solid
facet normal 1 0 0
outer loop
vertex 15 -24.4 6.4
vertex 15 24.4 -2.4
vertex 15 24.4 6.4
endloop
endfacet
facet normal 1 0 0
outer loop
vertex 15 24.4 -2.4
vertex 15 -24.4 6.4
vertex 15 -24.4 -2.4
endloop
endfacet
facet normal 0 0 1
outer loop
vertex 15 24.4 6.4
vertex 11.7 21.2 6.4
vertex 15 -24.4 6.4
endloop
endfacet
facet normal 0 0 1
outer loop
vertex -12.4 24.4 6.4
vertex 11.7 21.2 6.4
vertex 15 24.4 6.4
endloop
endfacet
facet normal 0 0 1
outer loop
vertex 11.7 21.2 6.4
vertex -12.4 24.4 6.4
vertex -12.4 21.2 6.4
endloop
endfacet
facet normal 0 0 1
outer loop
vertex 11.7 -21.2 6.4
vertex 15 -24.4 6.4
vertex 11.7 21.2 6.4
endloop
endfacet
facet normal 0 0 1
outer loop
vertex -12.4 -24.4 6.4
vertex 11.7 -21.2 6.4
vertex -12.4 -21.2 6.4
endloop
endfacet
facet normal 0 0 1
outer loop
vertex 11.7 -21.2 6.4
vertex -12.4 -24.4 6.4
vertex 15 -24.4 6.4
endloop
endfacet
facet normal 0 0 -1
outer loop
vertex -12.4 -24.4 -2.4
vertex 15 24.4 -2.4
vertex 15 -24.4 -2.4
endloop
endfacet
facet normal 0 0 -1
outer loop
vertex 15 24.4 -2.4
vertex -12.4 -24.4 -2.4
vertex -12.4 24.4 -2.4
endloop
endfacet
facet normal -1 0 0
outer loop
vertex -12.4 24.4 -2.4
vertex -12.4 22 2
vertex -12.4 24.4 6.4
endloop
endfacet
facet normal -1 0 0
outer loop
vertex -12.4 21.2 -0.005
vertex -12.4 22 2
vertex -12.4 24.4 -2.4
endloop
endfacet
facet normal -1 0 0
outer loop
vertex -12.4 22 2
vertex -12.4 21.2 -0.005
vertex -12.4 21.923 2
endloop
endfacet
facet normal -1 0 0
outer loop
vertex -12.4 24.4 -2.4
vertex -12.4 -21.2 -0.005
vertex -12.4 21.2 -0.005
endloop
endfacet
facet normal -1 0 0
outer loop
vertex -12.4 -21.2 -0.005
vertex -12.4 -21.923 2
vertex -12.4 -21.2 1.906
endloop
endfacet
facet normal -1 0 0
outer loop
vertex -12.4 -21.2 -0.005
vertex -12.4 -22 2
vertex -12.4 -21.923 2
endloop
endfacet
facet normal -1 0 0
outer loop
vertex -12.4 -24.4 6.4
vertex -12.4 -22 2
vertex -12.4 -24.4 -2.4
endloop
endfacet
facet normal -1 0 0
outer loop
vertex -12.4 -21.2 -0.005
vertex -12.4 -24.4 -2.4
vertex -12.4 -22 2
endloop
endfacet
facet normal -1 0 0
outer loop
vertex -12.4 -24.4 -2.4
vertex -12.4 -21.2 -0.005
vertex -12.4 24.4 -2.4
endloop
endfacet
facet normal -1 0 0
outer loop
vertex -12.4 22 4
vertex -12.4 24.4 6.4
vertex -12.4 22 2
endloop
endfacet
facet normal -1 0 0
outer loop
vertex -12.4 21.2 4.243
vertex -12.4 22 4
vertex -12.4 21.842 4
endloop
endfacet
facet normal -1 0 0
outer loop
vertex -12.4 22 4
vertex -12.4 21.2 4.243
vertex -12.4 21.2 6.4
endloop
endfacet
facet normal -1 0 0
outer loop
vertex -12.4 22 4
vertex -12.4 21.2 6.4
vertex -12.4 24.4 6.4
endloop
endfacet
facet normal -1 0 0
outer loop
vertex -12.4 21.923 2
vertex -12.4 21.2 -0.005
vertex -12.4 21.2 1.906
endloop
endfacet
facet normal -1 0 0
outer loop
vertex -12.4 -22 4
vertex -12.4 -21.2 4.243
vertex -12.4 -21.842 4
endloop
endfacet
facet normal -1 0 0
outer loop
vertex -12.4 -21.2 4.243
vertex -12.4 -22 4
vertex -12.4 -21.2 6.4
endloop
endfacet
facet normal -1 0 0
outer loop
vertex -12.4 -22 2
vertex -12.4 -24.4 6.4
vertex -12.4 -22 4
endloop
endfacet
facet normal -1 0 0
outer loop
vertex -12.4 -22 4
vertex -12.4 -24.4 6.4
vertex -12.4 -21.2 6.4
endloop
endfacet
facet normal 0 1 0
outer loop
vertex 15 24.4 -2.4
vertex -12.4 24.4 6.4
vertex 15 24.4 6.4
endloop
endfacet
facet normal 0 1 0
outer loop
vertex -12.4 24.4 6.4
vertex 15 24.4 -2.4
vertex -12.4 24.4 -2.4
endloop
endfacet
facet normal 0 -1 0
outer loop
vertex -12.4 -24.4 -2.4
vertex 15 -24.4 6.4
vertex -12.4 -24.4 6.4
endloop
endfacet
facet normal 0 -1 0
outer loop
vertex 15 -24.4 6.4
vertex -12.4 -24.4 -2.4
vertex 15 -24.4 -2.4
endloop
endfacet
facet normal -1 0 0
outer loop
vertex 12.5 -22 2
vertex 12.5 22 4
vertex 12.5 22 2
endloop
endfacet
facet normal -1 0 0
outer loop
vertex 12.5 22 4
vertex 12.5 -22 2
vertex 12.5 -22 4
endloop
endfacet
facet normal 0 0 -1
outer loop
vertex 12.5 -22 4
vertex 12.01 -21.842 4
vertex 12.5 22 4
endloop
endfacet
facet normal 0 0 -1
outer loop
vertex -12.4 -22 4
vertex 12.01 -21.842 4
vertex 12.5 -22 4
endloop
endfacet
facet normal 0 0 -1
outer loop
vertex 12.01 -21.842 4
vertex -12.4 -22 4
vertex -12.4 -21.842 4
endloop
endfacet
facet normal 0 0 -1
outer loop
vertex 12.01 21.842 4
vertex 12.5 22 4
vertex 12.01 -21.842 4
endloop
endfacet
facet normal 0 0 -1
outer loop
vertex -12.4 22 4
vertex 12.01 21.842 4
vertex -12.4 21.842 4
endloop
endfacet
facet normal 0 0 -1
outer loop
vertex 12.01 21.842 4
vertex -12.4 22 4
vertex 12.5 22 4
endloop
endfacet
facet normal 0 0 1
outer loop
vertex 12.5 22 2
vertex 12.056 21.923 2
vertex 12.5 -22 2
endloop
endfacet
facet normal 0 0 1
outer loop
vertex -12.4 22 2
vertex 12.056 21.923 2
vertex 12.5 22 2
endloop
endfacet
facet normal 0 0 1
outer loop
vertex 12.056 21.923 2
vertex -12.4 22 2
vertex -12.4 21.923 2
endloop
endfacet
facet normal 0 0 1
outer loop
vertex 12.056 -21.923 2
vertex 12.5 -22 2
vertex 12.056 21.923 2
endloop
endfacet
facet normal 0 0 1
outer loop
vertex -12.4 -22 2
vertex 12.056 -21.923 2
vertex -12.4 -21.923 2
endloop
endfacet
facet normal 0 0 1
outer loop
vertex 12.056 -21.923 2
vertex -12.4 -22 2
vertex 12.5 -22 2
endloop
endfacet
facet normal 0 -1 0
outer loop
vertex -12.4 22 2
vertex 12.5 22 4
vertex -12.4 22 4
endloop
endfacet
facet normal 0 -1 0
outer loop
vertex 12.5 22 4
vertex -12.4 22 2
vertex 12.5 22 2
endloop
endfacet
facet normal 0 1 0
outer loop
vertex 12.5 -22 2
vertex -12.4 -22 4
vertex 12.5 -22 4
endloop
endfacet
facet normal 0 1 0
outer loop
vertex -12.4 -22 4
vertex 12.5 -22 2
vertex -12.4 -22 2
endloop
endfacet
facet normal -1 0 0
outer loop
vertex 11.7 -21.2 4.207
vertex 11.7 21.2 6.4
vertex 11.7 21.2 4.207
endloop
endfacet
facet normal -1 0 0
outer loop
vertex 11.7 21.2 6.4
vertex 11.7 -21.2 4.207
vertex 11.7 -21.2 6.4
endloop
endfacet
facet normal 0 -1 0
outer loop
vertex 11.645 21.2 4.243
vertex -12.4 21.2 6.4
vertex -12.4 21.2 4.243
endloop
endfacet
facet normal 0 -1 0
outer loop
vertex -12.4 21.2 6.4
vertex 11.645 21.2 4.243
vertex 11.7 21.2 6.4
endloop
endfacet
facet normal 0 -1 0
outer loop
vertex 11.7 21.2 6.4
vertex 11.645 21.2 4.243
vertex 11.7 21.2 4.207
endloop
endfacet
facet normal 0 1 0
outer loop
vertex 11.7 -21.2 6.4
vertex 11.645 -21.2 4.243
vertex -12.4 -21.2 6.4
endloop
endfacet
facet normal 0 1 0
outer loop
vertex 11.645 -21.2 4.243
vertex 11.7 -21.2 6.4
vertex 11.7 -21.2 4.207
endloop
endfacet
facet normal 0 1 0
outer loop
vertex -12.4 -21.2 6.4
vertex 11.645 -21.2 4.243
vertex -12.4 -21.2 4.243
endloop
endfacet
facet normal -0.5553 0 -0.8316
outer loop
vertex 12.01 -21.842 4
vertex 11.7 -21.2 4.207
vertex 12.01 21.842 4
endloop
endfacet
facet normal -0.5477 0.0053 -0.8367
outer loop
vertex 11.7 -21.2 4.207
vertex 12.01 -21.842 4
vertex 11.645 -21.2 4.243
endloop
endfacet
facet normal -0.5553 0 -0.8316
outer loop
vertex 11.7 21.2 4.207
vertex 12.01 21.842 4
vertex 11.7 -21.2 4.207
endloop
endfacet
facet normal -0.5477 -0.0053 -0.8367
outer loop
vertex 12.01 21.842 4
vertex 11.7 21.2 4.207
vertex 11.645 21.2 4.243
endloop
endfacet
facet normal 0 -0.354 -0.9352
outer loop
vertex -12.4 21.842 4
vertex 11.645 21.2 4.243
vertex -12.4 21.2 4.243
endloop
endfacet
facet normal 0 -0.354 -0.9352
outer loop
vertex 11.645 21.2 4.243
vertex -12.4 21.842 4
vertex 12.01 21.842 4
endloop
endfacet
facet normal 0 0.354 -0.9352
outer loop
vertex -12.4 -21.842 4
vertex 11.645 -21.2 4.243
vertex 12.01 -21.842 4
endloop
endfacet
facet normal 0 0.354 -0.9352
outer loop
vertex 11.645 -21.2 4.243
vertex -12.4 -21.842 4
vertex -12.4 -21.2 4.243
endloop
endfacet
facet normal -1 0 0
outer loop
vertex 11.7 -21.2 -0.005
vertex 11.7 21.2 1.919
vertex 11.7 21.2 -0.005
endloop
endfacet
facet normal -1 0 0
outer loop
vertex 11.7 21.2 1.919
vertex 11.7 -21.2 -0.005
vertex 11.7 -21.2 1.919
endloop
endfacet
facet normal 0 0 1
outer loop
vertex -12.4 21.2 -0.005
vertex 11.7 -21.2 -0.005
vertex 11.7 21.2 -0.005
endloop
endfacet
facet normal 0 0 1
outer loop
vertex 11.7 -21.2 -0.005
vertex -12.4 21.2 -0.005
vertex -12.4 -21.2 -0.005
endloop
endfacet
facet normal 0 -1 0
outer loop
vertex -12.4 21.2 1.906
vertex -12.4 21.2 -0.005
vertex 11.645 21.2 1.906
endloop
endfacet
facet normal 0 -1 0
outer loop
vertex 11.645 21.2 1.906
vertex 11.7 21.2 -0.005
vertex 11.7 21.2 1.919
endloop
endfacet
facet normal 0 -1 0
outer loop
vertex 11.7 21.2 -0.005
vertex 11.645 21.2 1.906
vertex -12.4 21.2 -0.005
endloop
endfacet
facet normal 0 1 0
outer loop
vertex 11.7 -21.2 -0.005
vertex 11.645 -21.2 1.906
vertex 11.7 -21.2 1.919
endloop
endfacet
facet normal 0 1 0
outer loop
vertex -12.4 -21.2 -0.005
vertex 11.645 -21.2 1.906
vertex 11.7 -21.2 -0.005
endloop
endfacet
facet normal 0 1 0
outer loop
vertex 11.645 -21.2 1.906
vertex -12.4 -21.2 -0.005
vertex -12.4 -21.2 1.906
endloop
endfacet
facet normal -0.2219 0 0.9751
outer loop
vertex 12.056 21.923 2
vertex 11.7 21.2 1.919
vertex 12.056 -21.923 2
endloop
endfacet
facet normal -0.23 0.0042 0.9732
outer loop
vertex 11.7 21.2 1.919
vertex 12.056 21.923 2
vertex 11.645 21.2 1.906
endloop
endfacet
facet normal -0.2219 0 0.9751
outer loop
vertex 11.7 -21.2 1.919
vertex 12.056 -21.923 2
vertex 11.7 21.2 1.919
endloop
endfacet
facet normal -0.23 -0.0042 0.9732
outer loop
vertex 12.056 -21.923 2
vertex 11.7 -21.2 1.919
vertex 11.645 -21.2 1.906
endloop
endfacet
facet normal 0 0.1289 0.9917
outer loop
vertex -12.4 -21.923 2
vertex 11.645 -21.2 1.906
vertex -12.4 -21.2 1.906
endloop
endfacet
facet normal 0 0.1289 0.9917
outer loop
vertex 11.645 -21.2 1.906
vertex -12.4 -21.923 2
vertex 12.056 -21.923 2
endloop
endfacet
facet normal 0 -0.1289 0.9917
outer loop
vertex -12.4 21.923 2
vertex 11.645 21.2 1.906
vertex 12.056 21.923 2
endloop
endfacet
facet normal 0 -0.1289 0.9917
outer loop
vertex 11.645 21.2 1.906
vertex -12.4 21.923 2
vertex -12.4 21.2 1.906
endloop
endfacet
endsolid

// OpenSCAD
module step_down_1() {

  // preview[view:west, tilt:top diagonal]
  pcb_height=25;
  pcb_width=44;
  pcb_thick=2;
  grove=0.8;
  walls=2.4;
  bottom_offset=2;
  chamfer_top=7;//[0:10]
  chamfer_bottom=3;//[0:10]

  chamfer_top_=chamfer_top/10;
  chamfer_bottom_=chamfer_bottom/10;

  difference(){
    //box
    translate([walls/2+0.1,0,pcb_thick/2+bottom_offset/2]){
      cube([pcb_height+walls,pcb_width+walls*2,pcb_thick+walls*2+bottom_offset],center=true);
    }

    //pcb
    color("green")
      translate([0,0,pcb_thick/2+bottom_offset]){
        cube([pcb_height,pcb_width,pcb_thick],center=true);
      }

    //grove
    color("blue")
      translate([-grove/2,0,pcb_thick+walls/2+bottom_offset]){
        cube([pcb_height-grove,pcb_width-grove*2,walls+0.01],center=true);
      }


    //chamfer top
    color("red")
      translate([-grove/2,0,pcb_thick+walls/2+bottom_offset-0.01]){
        linear_extrude(height = walls+0.1, center = true, convexity = 3, scale = chamfer_top_){
        square(size = [pcb_height, pcb_width], center = true);
      }
    }

    //bottom offset
    color("Gray")
      translate([-grove/2,0,bottom_offset/2]){
        cube([pcb_height-grove,pcb_width-grove*2,bottom_offset+0.01],center=true);
      }

    //chamfer bottom
    color("Purple")
      translate([-grove/2,0,bottom_offset/2+0.01]){
        mirror([0,0,1]) 
          linear_extrude(height = bottom_offset, center = true, convexity = 3, scale = chamfer_bottom_){
          square(size = [pcb_height, pcb_width], center = true);
        }
      }

  }

}

step_down_1();
